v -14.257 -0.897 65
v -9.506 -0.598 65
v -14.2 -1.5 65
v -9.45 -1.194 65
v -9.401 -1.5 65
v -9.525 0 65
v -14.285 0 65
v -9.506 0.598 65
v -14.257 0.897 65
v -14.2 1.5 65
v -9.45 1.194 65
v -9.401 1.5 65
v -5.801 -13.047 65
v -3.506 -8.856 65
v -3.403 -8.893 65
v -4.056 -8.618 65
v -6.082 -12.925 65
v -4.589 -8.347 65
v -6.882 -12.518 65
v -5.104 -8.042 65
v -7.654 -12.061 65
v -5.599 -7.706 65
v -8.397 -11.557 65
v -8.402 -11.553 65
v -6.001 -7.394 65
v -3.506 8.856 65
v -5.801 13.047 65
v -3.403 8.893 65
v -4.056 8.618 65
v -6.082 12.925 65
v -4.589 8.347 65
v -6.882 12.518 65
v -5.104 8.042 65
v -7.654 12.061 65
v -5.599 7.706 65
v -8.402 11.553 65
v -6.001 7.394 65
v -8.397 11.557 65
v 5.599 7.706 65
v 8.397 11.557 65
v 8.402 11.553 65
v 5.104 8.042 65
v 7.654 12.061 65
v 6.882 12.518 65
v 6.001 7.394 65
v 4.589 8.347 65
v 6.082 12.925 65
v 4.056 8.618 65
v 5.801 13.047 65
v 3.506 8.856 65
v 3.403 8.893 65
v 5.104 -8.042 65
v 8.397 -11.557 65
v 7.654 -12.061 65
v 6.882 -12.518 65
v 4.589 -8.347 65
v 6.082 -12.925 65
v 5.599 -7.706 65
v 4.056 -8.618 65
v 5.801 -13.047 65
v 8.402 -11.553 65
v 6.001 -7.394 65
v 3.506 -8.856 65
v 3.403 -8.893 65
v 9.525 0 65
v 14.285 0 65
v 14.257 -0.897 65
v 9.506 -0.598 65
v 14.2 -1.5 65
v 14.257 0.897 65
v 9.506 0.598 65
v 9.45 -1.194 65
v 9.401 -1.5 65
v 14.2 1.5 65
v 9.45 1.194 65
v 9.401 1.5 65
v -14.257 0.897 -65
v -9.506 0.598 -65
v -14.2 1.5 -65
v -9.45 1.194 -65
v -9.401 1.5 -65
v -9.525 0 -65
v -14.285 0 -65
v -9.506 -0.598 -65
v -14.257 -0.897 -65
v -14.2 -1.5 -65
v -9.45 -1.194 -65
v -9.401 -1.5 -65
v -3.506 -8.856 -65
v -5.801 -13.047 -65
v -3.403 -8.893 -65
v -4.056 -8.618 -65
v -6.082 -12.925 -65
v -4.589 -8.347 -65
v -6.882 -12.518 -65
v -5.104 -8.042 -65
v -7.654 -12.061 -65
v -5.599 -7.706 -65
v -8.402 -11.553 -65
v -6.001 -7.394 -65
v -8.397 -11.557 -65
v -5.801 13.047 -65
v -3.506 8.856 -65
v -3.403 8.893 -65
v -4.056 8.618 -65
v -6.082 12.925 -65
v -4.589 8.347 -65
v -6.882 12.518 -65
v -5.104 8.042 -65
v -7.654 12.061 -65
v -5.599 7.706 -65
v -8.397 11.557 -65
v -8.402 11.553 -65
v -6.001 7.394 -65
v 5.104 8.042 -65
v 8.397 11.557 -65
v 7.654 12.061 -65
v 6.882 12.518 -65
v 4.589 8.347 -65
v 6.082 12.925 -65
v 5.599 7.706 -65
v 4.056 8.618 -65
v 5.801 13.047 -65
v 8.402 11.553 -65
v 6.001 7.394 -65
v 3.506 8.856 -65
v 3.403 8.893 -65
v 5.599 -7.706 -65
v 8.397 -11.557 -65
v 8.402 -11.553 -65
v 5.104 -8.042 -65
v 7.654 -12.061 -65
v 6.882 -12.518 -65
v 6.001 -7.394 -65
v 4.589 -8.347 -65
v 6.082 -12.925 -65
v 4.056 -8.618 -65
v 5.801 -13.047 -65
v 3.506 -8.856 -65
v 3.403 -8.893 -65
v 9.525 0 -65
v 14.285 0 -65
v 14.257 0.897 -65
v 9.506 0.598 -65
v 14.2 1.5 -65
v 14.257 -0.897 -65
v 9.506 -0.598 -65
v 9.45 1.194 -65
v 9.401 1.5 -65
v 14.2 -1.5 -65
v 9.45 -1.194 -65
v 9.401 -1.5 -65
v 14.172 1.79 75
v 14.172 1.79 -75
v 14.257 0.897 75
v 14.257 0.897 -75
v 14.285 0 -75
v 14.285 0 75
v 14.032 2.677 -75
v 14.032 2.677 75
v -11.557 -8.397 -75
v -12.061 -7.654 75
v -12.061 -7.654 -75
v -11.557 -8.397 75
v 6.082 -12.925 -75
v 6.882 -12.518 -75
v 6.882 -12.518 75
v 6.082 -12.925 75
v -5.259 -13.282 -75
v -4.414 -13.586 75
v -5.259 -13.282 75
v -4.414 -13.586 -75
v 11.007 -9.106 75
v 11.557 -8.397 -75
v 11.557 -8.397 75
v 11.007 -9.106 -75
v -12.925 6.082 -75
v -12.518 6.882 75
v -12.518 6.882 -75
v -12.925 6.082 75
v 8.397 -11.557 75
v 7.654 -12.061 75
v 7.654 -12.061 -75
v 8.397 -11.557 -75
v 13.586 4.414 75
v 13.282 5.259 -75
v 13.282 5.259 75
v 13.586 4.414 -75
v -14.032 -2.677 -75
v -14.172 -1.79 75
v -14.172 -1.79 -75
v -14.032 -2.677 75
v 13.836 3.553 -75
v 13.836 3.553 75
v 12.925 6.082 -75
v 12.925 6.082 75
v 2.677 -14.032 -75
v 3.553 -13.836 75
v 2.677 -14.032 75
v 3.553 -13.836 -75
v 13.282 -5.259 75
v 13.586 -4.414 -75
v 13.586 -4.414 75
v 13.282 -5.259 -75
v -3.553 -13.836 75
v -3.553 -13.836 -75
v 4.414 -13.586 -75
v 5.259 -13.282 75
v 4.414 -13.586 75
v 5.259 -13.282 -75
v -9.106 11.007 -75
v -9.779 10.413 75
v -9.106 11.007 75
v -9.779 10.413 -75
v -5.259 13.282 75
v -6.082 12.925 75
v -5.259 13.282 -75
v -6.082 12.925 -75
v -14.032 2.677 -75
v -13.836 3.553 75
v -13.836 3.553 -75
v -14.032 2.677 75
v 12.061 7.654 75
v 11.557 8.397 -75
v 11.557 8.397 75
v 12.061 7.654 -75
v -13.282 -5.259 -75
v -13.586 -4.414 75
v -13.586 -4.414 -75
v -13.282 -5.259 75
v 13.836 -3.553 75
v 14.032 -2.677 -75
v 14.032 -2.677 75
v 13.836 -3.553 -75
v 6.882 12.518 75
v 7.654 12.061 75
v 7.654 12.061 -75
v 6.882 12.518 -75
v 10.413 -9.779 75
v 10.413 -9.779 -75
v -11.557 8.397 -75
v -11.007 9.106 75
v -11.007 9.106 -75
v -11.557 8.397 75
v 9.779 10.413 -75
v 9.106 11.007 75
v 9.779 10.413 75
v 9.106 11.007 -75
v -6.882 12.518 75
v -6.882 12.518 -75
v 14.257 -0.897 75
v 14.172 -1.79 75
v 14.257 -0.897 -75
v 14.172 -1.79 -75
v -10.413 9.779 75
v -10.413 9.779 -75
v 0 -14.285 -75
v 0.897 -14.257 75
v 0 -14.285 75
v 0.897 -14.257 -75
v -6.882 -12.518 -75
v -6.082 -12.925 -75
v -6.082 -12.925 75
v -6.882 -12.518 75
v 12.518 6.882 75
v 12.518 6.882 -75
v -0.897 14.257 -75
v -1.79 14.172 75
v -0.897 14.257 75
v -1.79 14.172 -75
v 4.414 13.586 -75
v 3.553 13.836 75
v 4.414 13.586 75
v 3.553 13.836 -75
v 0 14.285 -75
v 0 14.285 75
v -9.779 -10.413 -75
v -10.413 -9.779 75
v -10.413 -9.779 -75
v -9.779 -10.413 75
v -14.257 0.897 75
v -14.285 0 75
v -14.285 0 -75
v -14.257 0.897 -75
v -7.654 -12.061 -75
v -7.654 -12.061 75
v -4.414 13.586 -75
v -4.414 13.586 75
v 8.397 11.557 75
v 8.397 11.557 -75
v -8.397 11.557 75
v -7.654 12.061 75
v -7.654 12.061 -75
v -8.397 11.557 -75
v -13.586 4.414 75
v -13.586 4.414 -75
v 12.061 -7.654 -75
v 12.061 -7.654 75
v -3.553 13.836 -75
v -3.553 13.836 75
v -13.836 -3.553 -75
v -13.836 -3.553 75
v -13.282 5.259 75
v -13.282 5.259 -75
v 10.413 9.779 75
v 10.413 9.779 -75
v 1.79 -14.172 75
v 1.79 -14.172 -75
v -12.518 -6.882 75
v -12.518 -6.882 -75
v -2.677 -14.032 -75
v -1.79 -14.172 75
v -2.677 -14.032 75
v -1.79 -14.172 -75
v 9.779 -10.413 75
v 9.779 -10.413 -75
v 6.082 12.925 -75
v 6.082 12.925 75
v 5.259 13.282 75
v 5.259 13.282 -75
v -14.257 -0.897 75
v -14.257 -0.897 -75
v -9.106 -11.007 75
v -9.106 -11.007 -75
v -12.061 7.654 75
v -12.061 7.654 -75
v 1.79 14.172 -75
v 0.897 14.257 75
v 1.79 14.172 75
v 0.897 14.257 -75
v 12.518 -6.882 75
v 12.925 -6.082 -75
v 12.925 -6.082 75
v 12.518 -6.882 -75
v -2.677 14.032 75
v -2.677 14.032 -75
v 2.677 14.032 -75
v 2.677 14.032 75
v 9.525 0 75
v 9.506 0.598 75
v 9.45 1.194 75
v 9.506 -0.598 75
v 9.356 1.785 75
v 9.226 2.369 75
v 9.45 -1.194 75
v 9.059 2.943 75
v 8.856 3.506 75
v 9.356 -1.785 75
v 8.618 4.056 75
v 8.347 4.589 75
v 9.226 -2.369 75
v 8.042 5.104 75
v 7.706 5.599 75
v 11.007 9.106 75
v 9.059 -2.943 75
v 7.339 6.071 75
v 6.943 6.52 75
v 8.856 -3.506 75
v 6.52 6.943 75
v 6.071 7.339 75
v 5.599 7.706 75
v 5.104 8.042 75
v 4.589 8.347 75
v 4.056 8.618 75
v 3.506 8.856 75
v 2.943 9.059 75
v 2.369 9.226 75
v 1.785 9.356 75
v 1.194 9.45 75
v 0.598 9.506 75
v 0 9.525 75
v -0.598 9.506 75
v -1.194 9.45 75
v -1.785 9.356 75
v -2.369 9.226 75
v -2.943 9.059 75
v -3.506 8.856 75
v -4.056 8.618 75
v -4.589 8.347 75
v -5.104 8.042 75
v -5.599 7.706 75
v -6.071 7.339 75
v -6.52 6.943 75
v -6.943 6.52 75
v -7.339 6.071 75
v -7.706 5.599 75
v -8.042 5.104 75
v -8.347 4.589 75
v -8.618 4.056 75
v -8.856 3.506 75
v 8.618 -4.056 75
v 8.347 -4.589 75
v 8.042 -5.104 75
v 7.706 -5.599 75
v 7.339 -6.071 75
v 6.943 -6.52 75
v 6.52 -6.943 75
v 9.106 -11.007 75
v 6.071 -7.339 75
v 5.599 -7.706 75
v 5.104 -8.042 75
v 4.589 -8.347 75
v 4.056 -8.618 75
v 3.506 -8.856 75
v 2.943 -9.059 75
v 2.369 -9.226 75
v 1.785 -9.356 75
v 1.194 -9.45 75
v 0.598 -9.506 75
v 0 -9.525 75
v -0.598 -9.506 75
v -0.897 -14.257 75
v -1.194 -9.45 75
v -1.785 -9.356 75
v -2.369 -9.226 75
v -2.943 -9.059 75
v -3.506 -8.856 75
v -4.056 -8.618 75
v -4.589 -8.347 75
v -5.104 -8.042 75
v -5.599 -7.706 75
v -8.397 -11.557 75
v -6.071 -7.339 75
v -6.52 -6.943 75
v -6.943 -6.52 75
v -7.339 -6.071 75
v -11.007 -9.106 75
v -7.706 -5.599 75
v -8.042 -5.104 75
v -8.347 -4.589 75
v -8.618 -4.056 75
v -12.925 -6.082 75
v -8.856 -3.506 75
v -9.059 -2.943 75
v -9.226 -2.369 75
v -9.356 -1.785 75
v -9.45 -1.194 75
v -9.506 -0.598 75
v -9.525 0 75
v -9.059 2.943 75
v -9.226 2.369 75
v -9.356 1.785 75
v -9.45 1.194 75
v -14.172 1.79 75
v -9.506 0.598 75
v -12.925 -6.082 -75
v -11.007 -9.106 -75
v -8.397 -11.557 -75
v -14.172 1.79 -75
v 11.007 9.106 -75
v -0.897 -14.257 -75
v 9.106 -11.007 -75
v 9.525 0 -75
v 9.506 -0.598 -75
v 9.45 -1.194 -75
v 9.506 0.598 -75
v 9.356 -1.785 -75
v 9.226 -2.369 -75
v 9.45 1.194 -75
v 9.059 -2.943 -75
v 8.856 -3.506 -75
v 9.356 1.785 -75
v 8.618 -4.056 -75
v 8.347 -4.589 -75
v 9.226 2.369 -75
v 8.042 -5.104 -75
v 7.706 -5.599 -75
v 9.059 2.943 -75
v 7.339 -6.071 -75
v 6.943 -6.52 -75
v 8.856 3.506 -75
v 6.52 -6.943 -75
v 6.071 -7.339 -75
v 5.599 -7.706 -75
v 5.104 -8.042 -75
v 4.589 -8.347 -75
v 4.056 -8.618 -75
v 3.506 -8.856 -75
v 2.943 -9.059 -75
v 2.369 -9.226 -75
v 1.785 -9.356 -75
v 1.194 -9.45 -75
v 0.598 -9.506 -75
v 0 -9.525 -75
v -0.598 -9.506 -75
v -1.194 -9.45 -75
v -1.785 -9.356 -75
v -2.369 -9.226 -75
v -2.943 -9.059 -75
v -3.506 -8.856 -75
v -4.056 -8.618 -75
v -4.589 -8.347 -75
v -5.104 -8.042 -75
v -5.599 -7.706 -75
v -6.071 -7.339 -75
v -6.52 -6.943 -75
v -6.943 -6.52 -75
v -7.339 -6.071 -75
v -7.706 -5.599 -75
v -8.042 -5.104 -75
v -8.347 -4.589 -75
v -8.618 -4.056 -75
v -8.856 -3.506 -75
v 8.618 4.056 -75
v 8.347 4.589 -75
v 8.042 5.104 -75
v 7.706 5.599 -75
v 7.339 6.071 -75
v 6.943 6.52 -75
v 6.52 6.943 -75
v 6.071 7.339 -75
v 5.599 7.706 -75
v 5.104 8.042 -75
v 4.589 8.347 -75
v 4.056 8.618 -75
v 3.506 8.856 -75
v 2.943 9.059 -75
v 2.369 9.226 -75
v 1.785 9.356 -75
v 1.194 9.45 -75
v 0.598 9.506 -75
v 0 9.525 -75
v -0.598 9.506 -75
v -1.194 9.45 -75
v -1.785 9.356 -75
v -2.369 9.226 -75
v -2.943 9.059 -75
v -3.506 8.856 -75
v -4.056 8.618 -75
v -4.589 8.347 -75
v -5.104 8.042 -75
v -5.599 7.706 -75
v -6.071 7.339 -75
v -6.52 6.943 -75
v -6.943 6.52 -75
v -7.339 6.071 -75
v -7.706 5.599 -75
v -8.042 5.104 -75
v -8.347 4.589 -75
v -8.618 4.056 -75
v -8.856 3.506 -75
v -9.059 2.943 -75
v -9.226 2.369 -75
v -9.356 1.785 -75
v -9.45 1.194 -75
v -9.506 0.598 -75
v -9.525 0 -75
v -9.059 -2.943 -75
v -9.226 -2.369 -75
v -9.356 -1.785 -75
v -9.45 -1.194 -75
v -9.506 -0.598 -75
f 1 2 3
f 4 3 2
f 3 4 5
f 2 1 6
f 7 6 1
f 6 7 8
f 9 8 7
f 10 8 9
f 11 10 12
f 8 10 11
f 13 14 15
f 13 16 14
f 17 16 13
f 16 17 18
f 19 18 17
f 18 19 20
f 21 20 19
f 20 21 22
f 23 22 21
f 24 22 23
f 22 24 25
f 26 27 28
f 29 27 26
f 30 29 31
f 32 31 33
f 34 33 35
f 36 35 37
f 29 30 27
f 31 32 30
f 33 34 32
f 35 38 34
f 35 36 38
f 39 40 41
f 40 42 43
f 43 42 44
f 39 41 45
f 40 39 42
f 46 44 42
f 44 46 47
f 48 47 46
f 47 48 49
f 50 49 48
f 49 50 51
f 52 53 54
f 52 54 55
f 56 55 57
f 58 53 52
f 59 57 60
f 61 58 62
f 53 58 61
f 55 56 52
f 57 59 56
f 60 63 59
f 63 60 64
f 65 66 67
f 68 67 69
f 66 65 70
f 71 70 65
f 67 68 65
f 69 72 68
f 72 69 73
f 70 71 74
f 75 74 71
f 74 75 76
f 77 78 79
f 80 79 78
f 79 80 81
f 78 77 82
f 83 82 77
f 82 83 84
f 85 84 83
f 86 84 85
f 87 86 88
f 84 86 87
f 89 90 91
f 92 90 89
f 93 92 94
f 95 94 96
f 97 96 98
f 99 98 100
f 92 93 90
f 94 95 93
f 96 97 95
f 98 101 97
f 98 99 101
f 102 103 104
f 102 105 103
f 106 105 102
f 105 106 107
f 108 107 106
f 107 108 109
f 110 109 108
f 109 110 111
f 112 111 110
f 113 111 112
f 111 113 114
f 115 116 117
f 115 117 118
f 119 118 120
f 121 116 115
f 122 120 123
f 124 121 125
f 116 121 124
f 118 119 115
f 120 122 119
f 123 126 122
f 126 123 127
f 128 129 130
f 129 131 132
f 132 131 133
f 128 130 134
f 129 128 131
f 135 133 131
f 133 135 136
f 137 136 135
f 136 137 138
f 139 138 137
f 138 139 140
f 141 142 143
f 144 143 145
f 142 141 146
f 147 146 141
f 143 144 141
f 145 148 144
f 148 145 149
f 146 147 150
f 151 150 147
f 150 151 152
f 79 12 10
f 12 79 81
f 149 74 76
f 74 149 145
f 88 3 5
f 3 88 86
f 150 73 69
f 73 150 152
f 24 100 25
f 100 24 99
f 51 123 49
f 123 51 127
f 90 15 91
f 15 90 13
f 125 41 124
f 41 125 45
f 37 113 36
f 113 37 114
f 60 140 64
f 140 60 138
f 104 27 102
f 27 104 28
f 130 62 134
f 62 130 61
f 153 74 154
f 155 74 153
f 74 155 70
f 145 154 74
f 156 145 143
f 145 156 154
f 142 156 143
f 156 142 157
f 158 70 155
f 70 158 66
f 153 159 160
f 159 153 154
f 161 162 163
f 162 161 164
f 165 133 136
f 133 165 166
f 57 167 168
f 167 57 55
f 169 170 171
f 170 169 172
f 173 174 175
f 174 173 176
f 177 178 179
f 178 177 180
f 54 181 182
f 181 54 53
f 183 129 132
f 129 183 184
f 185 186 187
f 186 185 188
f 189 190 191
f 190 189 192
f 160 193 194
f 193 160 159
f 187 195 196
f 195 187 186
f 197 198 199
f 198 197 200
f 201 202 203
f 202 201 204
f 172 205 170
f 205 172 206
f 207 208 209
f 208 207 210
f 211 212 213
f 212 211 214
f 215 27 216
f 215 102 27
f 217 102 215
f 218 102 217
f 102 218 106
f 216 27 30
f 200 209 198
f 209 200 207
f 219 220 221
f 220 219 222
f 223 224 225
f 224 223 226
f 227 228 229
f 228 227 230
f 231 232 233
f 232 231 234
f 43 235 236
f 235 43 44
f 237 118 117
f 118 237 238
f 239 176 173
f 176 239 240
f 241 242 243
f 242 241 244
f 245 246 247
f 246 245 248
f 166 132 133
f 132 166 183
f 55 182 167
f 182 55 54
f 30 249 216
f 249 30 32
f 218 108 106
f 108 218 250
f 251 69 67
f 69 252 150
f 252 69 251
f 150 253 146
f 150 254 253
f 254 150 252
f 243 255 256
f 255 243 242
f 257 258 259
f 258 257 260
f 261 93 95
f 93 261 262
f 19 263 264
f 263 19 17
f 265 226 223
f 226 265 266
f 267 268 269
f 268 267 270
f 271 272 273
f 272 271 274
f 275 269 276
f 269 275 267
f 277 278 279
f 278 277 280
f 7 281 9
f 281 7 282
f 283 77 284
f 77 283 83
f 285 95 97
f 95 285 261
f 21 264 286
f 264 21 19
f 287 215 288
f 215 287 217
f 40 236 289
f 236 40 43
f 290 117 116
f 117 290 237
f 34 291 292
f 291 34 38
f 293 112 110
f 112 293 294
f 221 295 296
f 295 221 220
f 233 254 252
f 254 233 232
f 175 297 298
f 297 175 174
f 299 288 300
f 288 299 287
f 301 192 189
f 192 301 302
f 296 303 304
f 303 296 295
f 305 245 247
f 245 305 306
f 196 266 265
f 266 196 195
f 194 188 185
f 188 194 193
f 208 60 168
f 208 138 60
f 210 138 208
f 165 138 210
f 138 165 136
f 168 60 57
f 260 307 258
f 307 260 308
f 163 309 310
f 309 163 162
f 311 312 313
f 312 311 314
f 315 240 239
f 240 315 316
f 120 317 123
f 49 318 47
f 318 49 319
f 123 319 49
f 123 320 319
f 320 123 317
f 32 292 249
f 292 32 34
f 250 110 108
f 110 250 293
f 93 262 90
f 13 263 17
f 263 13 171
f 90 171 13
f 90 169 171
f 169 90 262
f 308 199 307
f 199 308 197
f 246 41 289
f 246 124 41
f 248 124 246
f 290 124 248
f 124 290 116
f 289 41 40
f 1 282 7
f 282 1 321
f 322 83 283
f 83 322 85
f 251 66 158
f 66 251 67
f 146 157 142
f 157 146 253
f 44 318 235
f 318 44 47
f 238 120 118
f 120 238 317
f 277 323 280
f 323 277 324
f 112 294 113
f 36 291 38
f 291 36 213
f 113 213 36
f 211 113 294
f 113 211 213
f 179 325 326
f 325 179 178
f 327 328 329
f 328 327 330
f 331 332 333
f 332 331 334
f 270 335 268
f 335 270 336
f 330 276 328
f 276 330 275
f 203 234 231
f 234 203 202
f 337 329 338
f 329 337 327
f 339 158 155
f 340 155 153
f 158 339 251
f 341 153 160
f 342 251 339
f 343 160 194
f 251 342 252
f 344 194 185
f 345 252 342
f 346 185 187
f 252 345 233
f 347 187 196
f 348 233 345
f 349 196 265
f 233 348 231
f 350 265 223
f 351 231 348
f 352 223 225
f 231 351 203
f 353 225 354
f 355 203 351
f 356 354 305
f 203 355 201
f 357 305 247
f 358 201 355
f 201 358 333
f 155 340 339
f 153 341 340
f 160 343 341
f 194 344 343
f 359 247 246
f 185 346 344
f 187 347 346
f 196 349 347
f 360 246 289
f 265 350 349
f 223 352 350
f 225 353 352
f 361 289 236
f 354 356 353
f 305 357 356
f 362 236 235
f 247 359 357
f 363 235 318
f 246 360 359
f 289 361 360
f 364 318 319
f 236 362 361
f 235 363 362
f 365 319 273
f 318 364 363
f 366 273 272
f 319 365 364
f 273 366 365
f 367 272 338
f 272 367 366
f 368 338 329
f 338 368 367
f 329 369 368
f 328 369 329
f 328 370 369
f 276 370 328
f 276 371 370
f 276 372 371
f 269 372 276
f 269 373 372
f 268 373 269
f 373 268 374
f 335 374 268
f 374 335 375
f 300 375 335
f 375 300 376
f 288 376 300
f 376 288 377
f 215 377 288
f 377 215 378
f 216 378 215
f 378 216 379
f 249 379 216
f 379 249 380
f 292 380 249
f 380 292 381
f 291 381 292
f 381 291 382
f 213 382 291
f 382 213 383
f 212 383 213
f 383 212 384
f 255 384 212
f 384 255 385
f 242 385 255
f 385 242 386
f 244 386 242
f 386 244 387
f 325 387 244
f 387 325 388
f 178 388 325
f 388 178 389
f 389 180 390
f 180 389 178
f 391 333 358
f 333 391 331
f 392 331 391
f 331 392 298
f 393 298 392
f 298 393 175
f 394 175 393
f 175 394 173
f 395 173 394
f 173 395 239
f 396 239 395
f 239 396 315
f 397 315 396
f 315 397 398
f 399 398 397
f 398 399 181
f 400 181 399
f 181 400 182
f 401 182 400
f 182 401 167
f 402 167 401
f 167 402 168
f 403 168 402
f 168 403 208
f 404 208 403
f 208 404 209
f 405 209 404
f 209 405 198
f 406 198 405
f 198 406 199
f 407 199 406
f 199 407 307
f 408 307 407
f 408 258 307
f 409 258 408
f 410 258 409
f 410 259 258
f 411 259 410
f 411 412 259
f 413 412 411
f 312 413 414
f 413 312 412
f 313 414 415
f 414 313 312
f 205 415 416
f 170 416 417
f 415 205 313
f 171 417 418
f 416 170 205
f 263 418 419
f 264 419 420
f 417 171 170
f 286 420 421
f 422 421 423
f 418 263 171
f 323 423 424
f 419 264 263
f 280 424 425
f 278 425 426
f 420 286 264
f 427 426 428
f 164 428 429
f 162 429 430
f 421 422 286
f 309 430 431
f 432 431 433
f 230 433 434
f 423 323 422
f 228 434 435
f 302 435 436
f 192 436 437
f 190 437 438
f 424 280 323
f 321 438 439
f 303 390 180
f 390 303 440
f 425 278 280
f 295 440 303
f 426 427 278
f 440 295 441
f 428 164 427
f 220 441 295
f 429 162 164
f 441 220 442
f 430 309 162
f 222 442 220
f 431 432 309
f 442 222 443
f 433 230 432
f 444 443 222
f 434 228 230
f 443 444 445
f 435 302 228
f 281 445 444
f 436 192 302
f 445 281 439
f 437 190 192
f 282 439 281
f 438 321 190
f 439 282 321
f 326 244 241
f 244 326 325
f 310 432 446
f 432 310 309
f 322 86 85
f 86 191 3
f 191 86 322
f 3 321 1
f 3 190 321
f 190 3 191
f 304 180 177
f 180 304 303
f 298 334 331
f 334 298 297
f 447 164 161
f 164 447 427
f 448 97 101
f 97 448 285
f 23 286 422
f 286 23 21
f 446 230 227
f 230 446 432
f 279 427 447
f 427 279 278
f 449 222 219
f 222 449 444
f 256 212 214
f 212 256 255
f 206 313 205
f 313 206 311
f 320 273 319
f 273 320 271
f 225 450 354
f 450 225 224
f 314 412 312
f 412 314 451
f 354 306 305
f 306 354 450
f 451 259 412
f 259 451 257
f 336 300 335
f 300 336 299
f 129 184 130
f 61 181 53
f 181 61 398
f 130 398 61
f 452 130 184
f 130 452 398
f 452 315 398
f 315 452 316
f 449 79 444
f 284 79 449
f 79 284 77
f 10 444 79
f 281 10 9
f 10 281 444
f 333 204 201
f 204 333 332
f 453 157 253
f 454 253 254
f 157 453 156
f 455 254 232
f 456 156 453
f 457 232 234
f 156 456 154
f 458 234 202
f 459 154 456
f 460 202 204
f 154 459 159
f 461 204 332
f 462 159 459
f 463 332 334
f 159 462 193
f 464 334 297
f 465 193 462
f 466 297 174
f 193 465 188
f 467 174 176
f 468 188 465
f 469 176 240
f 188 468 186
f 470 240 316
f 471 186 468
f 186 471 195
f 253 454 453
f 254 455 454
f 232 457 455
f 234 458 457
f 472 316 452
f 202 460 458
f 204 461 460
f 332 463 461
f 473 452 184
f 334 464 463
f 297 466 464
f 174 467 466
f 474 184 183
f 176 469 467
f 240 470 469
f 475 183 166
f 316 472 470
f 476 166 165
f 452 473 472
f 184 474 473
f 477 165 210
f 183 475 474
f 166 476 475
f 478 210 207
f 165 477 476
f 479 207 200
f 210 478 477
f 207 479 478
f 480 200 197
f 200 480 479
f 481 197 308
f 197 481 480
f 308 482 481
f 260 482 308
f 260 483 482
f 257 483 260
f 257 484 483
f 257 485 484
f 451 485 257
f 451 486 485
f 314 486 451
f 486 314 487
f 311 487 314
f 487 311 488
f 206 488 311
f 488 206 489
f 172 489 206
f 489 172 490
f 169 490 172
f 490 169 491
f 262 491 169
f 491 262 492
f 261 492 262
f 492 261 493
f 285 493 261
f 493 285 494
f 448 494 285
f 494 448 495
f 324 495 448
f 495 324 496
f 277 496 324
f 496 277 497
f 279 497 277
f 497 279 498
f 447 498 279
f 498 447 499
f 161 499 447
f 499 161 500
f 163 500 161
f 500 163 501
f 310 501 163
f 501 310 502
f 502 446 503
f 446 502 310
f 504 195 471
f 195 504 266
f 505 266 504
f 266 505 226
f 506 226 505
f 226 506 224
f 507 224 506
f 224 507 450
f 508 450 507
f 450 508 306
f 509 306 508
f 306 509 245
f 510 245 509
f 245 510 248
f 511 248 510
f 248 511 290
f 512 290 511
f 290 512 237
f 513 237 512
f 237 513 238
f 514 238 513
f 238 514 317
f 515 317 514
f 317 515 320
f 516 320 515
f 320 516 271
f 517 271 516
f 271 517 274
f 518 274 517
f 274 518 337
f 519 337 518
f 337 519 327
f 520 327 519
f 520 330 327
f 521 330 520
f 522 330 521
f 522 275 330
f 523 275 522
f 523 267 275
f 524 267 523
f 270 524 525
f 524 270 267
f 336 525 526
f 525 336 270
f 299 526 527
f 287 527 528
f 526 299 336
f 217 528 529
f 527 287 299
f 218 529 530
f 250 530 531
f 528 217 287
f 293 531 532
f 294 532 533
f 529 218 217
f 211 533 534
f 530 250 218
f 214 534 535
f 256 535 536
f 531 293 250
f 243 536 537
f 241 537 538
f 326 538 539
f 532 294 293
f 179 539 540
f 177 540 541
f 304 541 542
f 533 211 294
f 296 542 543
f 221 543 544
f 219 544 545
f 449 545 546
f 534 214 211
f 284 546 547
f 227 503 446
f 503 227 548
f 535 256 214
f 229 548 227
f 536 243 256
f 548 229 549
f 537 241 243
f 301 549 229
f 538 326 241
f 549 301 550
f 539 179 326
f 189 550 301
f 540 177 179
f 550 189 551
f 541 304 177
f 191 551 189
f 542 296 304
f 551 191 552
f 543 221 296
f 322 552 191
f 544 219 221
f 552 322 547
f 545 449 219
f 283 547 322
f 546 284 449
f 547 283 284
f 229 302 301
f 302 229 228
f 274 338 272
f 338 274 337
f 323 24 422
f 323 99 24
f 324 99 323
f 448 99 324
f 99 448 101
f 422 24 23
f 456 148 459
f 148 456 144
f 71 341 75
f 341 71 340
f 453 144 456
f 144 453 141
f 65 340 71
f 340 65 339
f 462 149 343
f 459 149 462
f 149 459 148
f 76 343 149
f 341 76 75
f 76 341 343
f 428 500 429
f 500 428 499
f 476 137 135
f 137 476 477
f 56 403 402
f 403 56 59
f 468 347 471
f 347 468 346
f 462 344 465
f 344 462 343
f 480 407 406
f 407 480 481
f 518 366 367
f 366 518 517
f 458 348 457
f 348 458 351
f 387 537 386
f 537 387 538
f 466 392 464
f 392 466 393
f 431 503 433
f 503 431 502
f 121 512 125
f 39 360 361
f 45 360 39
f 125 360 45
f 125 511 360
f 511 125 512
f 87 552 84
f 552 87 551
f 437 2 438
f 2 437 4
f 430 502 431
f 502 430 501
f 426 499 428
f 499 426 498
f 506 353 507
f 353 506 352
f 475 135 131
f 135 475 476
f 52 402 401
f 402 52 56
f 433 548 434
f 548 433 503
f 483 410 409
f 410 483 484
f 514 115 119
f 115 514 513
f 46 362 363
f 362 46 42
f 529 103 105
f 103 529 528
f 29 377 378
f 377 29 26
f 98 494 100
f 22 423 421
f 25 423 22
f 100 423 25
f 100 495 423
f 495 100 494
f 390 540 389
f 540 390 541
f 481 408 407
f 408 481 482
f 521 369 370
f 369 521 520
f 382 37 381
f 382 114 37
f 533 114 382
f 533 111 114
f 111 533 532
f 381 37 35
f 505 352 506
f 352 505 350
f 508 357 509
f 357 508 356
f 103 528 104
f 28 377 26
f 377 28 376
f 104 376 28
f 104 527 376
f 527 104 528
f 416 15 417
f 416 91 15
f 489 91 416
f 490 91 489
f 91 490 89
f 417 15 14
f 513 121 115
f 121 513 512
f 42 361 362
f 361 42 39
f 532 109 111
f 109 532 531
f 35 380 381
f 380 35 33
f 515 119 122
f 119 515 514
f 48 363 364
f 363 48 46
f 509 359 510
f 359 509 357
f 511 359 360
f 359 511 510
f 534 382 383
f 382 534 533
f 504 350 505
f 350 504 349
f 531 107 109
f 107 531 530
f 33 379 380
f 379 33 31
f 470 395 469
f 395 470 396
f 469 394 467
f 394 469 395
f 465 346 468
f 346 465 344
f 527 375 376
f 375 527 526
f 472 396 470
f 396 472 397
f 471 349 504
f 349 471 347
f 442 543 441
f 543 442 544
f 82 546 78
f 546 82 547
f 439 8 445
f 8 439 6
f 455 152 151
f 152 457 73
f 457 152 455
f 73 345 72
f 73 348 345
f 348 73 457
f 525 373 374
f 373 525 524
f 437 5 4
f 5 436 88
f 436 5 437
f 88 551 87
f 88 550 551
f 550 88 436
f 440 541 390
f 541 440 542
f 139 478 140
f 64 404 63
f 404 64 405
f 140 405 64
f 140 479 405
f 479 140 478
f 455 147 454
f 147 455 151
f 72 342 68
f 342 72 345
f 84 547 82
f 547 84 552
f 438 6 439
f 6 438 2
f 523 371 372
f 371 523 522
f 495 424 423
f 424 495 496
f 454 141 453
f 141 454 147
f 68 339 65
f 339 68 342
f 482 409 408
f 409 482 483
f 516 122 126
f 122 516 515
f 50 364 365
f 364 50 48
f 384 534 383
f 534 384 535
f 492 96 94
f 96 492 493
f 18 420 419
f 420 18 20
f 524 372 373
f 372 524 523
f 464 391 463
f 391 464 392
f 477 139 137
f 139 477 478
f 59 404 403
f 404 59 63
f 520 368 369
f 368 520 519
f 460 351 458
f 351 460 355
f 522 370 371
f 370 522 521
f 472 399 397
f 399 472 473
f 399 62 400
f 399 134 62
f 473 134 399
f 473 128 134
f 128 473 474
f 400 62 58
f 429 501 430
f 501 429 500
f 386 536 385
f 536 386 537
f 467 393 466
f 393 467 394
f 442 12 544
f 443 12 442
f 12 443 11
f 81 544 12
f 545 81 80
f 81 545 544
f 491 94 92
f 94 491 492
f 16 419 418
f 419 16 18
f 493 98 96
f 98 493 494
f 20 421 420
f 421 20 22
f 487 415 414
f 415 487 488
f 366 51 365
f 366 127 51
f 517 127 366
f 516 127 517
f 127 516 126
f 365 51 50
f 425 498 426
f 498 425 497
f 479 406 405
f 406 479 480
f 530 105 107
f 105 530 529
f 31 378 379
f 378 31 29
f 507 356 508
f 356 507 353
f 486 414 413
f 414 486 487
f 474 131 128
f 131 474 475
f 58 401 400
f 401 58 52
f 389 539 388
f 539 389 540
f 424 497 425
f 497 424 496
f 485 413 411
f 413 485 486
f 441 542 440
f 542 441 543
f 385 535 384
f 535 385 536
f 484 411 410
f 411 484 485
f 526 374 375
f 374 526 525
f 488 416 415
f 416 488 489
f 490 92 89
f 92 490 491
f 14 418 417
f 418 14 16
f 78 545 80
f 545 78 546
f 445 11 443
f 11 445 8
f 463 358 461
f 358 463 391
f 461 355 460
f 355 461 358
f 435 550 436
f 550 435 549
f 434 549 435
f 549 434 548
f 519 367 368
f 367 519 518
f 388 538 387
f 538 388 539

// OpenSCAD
// Gundam Robotics Systems - Fused Silica Liner
// Standardized for -12 Dash Size

$fn = 100;

// Parameters
bore_id = 19.05;      // 3/4 inch ID
wall_thickness = 4.76; // Initial simulation thickness
length = 150;
uv_port_width = 3;     // Width of UV access slits
uv_port_count = 6;     // Number of radial windows

difference() {
    // Main Tube Body
    cylinder(h = length, d = bore_id + (2 * wall_thickness), center = true);
    
    // Internal Bore (The Plasma Chamber)
    cylinder(h = length + 2, d = bore_id, center = true);
    
    // UV Access Windows
    for (i = [0 : uv_port_count - 1]) {
        rotate([0, 0, i * (360 / uv_port_count)])
        translate([0, 0, 0])
        cube([bore_id + 15, uv_port_width, length - 20], center = true);
    }
}
